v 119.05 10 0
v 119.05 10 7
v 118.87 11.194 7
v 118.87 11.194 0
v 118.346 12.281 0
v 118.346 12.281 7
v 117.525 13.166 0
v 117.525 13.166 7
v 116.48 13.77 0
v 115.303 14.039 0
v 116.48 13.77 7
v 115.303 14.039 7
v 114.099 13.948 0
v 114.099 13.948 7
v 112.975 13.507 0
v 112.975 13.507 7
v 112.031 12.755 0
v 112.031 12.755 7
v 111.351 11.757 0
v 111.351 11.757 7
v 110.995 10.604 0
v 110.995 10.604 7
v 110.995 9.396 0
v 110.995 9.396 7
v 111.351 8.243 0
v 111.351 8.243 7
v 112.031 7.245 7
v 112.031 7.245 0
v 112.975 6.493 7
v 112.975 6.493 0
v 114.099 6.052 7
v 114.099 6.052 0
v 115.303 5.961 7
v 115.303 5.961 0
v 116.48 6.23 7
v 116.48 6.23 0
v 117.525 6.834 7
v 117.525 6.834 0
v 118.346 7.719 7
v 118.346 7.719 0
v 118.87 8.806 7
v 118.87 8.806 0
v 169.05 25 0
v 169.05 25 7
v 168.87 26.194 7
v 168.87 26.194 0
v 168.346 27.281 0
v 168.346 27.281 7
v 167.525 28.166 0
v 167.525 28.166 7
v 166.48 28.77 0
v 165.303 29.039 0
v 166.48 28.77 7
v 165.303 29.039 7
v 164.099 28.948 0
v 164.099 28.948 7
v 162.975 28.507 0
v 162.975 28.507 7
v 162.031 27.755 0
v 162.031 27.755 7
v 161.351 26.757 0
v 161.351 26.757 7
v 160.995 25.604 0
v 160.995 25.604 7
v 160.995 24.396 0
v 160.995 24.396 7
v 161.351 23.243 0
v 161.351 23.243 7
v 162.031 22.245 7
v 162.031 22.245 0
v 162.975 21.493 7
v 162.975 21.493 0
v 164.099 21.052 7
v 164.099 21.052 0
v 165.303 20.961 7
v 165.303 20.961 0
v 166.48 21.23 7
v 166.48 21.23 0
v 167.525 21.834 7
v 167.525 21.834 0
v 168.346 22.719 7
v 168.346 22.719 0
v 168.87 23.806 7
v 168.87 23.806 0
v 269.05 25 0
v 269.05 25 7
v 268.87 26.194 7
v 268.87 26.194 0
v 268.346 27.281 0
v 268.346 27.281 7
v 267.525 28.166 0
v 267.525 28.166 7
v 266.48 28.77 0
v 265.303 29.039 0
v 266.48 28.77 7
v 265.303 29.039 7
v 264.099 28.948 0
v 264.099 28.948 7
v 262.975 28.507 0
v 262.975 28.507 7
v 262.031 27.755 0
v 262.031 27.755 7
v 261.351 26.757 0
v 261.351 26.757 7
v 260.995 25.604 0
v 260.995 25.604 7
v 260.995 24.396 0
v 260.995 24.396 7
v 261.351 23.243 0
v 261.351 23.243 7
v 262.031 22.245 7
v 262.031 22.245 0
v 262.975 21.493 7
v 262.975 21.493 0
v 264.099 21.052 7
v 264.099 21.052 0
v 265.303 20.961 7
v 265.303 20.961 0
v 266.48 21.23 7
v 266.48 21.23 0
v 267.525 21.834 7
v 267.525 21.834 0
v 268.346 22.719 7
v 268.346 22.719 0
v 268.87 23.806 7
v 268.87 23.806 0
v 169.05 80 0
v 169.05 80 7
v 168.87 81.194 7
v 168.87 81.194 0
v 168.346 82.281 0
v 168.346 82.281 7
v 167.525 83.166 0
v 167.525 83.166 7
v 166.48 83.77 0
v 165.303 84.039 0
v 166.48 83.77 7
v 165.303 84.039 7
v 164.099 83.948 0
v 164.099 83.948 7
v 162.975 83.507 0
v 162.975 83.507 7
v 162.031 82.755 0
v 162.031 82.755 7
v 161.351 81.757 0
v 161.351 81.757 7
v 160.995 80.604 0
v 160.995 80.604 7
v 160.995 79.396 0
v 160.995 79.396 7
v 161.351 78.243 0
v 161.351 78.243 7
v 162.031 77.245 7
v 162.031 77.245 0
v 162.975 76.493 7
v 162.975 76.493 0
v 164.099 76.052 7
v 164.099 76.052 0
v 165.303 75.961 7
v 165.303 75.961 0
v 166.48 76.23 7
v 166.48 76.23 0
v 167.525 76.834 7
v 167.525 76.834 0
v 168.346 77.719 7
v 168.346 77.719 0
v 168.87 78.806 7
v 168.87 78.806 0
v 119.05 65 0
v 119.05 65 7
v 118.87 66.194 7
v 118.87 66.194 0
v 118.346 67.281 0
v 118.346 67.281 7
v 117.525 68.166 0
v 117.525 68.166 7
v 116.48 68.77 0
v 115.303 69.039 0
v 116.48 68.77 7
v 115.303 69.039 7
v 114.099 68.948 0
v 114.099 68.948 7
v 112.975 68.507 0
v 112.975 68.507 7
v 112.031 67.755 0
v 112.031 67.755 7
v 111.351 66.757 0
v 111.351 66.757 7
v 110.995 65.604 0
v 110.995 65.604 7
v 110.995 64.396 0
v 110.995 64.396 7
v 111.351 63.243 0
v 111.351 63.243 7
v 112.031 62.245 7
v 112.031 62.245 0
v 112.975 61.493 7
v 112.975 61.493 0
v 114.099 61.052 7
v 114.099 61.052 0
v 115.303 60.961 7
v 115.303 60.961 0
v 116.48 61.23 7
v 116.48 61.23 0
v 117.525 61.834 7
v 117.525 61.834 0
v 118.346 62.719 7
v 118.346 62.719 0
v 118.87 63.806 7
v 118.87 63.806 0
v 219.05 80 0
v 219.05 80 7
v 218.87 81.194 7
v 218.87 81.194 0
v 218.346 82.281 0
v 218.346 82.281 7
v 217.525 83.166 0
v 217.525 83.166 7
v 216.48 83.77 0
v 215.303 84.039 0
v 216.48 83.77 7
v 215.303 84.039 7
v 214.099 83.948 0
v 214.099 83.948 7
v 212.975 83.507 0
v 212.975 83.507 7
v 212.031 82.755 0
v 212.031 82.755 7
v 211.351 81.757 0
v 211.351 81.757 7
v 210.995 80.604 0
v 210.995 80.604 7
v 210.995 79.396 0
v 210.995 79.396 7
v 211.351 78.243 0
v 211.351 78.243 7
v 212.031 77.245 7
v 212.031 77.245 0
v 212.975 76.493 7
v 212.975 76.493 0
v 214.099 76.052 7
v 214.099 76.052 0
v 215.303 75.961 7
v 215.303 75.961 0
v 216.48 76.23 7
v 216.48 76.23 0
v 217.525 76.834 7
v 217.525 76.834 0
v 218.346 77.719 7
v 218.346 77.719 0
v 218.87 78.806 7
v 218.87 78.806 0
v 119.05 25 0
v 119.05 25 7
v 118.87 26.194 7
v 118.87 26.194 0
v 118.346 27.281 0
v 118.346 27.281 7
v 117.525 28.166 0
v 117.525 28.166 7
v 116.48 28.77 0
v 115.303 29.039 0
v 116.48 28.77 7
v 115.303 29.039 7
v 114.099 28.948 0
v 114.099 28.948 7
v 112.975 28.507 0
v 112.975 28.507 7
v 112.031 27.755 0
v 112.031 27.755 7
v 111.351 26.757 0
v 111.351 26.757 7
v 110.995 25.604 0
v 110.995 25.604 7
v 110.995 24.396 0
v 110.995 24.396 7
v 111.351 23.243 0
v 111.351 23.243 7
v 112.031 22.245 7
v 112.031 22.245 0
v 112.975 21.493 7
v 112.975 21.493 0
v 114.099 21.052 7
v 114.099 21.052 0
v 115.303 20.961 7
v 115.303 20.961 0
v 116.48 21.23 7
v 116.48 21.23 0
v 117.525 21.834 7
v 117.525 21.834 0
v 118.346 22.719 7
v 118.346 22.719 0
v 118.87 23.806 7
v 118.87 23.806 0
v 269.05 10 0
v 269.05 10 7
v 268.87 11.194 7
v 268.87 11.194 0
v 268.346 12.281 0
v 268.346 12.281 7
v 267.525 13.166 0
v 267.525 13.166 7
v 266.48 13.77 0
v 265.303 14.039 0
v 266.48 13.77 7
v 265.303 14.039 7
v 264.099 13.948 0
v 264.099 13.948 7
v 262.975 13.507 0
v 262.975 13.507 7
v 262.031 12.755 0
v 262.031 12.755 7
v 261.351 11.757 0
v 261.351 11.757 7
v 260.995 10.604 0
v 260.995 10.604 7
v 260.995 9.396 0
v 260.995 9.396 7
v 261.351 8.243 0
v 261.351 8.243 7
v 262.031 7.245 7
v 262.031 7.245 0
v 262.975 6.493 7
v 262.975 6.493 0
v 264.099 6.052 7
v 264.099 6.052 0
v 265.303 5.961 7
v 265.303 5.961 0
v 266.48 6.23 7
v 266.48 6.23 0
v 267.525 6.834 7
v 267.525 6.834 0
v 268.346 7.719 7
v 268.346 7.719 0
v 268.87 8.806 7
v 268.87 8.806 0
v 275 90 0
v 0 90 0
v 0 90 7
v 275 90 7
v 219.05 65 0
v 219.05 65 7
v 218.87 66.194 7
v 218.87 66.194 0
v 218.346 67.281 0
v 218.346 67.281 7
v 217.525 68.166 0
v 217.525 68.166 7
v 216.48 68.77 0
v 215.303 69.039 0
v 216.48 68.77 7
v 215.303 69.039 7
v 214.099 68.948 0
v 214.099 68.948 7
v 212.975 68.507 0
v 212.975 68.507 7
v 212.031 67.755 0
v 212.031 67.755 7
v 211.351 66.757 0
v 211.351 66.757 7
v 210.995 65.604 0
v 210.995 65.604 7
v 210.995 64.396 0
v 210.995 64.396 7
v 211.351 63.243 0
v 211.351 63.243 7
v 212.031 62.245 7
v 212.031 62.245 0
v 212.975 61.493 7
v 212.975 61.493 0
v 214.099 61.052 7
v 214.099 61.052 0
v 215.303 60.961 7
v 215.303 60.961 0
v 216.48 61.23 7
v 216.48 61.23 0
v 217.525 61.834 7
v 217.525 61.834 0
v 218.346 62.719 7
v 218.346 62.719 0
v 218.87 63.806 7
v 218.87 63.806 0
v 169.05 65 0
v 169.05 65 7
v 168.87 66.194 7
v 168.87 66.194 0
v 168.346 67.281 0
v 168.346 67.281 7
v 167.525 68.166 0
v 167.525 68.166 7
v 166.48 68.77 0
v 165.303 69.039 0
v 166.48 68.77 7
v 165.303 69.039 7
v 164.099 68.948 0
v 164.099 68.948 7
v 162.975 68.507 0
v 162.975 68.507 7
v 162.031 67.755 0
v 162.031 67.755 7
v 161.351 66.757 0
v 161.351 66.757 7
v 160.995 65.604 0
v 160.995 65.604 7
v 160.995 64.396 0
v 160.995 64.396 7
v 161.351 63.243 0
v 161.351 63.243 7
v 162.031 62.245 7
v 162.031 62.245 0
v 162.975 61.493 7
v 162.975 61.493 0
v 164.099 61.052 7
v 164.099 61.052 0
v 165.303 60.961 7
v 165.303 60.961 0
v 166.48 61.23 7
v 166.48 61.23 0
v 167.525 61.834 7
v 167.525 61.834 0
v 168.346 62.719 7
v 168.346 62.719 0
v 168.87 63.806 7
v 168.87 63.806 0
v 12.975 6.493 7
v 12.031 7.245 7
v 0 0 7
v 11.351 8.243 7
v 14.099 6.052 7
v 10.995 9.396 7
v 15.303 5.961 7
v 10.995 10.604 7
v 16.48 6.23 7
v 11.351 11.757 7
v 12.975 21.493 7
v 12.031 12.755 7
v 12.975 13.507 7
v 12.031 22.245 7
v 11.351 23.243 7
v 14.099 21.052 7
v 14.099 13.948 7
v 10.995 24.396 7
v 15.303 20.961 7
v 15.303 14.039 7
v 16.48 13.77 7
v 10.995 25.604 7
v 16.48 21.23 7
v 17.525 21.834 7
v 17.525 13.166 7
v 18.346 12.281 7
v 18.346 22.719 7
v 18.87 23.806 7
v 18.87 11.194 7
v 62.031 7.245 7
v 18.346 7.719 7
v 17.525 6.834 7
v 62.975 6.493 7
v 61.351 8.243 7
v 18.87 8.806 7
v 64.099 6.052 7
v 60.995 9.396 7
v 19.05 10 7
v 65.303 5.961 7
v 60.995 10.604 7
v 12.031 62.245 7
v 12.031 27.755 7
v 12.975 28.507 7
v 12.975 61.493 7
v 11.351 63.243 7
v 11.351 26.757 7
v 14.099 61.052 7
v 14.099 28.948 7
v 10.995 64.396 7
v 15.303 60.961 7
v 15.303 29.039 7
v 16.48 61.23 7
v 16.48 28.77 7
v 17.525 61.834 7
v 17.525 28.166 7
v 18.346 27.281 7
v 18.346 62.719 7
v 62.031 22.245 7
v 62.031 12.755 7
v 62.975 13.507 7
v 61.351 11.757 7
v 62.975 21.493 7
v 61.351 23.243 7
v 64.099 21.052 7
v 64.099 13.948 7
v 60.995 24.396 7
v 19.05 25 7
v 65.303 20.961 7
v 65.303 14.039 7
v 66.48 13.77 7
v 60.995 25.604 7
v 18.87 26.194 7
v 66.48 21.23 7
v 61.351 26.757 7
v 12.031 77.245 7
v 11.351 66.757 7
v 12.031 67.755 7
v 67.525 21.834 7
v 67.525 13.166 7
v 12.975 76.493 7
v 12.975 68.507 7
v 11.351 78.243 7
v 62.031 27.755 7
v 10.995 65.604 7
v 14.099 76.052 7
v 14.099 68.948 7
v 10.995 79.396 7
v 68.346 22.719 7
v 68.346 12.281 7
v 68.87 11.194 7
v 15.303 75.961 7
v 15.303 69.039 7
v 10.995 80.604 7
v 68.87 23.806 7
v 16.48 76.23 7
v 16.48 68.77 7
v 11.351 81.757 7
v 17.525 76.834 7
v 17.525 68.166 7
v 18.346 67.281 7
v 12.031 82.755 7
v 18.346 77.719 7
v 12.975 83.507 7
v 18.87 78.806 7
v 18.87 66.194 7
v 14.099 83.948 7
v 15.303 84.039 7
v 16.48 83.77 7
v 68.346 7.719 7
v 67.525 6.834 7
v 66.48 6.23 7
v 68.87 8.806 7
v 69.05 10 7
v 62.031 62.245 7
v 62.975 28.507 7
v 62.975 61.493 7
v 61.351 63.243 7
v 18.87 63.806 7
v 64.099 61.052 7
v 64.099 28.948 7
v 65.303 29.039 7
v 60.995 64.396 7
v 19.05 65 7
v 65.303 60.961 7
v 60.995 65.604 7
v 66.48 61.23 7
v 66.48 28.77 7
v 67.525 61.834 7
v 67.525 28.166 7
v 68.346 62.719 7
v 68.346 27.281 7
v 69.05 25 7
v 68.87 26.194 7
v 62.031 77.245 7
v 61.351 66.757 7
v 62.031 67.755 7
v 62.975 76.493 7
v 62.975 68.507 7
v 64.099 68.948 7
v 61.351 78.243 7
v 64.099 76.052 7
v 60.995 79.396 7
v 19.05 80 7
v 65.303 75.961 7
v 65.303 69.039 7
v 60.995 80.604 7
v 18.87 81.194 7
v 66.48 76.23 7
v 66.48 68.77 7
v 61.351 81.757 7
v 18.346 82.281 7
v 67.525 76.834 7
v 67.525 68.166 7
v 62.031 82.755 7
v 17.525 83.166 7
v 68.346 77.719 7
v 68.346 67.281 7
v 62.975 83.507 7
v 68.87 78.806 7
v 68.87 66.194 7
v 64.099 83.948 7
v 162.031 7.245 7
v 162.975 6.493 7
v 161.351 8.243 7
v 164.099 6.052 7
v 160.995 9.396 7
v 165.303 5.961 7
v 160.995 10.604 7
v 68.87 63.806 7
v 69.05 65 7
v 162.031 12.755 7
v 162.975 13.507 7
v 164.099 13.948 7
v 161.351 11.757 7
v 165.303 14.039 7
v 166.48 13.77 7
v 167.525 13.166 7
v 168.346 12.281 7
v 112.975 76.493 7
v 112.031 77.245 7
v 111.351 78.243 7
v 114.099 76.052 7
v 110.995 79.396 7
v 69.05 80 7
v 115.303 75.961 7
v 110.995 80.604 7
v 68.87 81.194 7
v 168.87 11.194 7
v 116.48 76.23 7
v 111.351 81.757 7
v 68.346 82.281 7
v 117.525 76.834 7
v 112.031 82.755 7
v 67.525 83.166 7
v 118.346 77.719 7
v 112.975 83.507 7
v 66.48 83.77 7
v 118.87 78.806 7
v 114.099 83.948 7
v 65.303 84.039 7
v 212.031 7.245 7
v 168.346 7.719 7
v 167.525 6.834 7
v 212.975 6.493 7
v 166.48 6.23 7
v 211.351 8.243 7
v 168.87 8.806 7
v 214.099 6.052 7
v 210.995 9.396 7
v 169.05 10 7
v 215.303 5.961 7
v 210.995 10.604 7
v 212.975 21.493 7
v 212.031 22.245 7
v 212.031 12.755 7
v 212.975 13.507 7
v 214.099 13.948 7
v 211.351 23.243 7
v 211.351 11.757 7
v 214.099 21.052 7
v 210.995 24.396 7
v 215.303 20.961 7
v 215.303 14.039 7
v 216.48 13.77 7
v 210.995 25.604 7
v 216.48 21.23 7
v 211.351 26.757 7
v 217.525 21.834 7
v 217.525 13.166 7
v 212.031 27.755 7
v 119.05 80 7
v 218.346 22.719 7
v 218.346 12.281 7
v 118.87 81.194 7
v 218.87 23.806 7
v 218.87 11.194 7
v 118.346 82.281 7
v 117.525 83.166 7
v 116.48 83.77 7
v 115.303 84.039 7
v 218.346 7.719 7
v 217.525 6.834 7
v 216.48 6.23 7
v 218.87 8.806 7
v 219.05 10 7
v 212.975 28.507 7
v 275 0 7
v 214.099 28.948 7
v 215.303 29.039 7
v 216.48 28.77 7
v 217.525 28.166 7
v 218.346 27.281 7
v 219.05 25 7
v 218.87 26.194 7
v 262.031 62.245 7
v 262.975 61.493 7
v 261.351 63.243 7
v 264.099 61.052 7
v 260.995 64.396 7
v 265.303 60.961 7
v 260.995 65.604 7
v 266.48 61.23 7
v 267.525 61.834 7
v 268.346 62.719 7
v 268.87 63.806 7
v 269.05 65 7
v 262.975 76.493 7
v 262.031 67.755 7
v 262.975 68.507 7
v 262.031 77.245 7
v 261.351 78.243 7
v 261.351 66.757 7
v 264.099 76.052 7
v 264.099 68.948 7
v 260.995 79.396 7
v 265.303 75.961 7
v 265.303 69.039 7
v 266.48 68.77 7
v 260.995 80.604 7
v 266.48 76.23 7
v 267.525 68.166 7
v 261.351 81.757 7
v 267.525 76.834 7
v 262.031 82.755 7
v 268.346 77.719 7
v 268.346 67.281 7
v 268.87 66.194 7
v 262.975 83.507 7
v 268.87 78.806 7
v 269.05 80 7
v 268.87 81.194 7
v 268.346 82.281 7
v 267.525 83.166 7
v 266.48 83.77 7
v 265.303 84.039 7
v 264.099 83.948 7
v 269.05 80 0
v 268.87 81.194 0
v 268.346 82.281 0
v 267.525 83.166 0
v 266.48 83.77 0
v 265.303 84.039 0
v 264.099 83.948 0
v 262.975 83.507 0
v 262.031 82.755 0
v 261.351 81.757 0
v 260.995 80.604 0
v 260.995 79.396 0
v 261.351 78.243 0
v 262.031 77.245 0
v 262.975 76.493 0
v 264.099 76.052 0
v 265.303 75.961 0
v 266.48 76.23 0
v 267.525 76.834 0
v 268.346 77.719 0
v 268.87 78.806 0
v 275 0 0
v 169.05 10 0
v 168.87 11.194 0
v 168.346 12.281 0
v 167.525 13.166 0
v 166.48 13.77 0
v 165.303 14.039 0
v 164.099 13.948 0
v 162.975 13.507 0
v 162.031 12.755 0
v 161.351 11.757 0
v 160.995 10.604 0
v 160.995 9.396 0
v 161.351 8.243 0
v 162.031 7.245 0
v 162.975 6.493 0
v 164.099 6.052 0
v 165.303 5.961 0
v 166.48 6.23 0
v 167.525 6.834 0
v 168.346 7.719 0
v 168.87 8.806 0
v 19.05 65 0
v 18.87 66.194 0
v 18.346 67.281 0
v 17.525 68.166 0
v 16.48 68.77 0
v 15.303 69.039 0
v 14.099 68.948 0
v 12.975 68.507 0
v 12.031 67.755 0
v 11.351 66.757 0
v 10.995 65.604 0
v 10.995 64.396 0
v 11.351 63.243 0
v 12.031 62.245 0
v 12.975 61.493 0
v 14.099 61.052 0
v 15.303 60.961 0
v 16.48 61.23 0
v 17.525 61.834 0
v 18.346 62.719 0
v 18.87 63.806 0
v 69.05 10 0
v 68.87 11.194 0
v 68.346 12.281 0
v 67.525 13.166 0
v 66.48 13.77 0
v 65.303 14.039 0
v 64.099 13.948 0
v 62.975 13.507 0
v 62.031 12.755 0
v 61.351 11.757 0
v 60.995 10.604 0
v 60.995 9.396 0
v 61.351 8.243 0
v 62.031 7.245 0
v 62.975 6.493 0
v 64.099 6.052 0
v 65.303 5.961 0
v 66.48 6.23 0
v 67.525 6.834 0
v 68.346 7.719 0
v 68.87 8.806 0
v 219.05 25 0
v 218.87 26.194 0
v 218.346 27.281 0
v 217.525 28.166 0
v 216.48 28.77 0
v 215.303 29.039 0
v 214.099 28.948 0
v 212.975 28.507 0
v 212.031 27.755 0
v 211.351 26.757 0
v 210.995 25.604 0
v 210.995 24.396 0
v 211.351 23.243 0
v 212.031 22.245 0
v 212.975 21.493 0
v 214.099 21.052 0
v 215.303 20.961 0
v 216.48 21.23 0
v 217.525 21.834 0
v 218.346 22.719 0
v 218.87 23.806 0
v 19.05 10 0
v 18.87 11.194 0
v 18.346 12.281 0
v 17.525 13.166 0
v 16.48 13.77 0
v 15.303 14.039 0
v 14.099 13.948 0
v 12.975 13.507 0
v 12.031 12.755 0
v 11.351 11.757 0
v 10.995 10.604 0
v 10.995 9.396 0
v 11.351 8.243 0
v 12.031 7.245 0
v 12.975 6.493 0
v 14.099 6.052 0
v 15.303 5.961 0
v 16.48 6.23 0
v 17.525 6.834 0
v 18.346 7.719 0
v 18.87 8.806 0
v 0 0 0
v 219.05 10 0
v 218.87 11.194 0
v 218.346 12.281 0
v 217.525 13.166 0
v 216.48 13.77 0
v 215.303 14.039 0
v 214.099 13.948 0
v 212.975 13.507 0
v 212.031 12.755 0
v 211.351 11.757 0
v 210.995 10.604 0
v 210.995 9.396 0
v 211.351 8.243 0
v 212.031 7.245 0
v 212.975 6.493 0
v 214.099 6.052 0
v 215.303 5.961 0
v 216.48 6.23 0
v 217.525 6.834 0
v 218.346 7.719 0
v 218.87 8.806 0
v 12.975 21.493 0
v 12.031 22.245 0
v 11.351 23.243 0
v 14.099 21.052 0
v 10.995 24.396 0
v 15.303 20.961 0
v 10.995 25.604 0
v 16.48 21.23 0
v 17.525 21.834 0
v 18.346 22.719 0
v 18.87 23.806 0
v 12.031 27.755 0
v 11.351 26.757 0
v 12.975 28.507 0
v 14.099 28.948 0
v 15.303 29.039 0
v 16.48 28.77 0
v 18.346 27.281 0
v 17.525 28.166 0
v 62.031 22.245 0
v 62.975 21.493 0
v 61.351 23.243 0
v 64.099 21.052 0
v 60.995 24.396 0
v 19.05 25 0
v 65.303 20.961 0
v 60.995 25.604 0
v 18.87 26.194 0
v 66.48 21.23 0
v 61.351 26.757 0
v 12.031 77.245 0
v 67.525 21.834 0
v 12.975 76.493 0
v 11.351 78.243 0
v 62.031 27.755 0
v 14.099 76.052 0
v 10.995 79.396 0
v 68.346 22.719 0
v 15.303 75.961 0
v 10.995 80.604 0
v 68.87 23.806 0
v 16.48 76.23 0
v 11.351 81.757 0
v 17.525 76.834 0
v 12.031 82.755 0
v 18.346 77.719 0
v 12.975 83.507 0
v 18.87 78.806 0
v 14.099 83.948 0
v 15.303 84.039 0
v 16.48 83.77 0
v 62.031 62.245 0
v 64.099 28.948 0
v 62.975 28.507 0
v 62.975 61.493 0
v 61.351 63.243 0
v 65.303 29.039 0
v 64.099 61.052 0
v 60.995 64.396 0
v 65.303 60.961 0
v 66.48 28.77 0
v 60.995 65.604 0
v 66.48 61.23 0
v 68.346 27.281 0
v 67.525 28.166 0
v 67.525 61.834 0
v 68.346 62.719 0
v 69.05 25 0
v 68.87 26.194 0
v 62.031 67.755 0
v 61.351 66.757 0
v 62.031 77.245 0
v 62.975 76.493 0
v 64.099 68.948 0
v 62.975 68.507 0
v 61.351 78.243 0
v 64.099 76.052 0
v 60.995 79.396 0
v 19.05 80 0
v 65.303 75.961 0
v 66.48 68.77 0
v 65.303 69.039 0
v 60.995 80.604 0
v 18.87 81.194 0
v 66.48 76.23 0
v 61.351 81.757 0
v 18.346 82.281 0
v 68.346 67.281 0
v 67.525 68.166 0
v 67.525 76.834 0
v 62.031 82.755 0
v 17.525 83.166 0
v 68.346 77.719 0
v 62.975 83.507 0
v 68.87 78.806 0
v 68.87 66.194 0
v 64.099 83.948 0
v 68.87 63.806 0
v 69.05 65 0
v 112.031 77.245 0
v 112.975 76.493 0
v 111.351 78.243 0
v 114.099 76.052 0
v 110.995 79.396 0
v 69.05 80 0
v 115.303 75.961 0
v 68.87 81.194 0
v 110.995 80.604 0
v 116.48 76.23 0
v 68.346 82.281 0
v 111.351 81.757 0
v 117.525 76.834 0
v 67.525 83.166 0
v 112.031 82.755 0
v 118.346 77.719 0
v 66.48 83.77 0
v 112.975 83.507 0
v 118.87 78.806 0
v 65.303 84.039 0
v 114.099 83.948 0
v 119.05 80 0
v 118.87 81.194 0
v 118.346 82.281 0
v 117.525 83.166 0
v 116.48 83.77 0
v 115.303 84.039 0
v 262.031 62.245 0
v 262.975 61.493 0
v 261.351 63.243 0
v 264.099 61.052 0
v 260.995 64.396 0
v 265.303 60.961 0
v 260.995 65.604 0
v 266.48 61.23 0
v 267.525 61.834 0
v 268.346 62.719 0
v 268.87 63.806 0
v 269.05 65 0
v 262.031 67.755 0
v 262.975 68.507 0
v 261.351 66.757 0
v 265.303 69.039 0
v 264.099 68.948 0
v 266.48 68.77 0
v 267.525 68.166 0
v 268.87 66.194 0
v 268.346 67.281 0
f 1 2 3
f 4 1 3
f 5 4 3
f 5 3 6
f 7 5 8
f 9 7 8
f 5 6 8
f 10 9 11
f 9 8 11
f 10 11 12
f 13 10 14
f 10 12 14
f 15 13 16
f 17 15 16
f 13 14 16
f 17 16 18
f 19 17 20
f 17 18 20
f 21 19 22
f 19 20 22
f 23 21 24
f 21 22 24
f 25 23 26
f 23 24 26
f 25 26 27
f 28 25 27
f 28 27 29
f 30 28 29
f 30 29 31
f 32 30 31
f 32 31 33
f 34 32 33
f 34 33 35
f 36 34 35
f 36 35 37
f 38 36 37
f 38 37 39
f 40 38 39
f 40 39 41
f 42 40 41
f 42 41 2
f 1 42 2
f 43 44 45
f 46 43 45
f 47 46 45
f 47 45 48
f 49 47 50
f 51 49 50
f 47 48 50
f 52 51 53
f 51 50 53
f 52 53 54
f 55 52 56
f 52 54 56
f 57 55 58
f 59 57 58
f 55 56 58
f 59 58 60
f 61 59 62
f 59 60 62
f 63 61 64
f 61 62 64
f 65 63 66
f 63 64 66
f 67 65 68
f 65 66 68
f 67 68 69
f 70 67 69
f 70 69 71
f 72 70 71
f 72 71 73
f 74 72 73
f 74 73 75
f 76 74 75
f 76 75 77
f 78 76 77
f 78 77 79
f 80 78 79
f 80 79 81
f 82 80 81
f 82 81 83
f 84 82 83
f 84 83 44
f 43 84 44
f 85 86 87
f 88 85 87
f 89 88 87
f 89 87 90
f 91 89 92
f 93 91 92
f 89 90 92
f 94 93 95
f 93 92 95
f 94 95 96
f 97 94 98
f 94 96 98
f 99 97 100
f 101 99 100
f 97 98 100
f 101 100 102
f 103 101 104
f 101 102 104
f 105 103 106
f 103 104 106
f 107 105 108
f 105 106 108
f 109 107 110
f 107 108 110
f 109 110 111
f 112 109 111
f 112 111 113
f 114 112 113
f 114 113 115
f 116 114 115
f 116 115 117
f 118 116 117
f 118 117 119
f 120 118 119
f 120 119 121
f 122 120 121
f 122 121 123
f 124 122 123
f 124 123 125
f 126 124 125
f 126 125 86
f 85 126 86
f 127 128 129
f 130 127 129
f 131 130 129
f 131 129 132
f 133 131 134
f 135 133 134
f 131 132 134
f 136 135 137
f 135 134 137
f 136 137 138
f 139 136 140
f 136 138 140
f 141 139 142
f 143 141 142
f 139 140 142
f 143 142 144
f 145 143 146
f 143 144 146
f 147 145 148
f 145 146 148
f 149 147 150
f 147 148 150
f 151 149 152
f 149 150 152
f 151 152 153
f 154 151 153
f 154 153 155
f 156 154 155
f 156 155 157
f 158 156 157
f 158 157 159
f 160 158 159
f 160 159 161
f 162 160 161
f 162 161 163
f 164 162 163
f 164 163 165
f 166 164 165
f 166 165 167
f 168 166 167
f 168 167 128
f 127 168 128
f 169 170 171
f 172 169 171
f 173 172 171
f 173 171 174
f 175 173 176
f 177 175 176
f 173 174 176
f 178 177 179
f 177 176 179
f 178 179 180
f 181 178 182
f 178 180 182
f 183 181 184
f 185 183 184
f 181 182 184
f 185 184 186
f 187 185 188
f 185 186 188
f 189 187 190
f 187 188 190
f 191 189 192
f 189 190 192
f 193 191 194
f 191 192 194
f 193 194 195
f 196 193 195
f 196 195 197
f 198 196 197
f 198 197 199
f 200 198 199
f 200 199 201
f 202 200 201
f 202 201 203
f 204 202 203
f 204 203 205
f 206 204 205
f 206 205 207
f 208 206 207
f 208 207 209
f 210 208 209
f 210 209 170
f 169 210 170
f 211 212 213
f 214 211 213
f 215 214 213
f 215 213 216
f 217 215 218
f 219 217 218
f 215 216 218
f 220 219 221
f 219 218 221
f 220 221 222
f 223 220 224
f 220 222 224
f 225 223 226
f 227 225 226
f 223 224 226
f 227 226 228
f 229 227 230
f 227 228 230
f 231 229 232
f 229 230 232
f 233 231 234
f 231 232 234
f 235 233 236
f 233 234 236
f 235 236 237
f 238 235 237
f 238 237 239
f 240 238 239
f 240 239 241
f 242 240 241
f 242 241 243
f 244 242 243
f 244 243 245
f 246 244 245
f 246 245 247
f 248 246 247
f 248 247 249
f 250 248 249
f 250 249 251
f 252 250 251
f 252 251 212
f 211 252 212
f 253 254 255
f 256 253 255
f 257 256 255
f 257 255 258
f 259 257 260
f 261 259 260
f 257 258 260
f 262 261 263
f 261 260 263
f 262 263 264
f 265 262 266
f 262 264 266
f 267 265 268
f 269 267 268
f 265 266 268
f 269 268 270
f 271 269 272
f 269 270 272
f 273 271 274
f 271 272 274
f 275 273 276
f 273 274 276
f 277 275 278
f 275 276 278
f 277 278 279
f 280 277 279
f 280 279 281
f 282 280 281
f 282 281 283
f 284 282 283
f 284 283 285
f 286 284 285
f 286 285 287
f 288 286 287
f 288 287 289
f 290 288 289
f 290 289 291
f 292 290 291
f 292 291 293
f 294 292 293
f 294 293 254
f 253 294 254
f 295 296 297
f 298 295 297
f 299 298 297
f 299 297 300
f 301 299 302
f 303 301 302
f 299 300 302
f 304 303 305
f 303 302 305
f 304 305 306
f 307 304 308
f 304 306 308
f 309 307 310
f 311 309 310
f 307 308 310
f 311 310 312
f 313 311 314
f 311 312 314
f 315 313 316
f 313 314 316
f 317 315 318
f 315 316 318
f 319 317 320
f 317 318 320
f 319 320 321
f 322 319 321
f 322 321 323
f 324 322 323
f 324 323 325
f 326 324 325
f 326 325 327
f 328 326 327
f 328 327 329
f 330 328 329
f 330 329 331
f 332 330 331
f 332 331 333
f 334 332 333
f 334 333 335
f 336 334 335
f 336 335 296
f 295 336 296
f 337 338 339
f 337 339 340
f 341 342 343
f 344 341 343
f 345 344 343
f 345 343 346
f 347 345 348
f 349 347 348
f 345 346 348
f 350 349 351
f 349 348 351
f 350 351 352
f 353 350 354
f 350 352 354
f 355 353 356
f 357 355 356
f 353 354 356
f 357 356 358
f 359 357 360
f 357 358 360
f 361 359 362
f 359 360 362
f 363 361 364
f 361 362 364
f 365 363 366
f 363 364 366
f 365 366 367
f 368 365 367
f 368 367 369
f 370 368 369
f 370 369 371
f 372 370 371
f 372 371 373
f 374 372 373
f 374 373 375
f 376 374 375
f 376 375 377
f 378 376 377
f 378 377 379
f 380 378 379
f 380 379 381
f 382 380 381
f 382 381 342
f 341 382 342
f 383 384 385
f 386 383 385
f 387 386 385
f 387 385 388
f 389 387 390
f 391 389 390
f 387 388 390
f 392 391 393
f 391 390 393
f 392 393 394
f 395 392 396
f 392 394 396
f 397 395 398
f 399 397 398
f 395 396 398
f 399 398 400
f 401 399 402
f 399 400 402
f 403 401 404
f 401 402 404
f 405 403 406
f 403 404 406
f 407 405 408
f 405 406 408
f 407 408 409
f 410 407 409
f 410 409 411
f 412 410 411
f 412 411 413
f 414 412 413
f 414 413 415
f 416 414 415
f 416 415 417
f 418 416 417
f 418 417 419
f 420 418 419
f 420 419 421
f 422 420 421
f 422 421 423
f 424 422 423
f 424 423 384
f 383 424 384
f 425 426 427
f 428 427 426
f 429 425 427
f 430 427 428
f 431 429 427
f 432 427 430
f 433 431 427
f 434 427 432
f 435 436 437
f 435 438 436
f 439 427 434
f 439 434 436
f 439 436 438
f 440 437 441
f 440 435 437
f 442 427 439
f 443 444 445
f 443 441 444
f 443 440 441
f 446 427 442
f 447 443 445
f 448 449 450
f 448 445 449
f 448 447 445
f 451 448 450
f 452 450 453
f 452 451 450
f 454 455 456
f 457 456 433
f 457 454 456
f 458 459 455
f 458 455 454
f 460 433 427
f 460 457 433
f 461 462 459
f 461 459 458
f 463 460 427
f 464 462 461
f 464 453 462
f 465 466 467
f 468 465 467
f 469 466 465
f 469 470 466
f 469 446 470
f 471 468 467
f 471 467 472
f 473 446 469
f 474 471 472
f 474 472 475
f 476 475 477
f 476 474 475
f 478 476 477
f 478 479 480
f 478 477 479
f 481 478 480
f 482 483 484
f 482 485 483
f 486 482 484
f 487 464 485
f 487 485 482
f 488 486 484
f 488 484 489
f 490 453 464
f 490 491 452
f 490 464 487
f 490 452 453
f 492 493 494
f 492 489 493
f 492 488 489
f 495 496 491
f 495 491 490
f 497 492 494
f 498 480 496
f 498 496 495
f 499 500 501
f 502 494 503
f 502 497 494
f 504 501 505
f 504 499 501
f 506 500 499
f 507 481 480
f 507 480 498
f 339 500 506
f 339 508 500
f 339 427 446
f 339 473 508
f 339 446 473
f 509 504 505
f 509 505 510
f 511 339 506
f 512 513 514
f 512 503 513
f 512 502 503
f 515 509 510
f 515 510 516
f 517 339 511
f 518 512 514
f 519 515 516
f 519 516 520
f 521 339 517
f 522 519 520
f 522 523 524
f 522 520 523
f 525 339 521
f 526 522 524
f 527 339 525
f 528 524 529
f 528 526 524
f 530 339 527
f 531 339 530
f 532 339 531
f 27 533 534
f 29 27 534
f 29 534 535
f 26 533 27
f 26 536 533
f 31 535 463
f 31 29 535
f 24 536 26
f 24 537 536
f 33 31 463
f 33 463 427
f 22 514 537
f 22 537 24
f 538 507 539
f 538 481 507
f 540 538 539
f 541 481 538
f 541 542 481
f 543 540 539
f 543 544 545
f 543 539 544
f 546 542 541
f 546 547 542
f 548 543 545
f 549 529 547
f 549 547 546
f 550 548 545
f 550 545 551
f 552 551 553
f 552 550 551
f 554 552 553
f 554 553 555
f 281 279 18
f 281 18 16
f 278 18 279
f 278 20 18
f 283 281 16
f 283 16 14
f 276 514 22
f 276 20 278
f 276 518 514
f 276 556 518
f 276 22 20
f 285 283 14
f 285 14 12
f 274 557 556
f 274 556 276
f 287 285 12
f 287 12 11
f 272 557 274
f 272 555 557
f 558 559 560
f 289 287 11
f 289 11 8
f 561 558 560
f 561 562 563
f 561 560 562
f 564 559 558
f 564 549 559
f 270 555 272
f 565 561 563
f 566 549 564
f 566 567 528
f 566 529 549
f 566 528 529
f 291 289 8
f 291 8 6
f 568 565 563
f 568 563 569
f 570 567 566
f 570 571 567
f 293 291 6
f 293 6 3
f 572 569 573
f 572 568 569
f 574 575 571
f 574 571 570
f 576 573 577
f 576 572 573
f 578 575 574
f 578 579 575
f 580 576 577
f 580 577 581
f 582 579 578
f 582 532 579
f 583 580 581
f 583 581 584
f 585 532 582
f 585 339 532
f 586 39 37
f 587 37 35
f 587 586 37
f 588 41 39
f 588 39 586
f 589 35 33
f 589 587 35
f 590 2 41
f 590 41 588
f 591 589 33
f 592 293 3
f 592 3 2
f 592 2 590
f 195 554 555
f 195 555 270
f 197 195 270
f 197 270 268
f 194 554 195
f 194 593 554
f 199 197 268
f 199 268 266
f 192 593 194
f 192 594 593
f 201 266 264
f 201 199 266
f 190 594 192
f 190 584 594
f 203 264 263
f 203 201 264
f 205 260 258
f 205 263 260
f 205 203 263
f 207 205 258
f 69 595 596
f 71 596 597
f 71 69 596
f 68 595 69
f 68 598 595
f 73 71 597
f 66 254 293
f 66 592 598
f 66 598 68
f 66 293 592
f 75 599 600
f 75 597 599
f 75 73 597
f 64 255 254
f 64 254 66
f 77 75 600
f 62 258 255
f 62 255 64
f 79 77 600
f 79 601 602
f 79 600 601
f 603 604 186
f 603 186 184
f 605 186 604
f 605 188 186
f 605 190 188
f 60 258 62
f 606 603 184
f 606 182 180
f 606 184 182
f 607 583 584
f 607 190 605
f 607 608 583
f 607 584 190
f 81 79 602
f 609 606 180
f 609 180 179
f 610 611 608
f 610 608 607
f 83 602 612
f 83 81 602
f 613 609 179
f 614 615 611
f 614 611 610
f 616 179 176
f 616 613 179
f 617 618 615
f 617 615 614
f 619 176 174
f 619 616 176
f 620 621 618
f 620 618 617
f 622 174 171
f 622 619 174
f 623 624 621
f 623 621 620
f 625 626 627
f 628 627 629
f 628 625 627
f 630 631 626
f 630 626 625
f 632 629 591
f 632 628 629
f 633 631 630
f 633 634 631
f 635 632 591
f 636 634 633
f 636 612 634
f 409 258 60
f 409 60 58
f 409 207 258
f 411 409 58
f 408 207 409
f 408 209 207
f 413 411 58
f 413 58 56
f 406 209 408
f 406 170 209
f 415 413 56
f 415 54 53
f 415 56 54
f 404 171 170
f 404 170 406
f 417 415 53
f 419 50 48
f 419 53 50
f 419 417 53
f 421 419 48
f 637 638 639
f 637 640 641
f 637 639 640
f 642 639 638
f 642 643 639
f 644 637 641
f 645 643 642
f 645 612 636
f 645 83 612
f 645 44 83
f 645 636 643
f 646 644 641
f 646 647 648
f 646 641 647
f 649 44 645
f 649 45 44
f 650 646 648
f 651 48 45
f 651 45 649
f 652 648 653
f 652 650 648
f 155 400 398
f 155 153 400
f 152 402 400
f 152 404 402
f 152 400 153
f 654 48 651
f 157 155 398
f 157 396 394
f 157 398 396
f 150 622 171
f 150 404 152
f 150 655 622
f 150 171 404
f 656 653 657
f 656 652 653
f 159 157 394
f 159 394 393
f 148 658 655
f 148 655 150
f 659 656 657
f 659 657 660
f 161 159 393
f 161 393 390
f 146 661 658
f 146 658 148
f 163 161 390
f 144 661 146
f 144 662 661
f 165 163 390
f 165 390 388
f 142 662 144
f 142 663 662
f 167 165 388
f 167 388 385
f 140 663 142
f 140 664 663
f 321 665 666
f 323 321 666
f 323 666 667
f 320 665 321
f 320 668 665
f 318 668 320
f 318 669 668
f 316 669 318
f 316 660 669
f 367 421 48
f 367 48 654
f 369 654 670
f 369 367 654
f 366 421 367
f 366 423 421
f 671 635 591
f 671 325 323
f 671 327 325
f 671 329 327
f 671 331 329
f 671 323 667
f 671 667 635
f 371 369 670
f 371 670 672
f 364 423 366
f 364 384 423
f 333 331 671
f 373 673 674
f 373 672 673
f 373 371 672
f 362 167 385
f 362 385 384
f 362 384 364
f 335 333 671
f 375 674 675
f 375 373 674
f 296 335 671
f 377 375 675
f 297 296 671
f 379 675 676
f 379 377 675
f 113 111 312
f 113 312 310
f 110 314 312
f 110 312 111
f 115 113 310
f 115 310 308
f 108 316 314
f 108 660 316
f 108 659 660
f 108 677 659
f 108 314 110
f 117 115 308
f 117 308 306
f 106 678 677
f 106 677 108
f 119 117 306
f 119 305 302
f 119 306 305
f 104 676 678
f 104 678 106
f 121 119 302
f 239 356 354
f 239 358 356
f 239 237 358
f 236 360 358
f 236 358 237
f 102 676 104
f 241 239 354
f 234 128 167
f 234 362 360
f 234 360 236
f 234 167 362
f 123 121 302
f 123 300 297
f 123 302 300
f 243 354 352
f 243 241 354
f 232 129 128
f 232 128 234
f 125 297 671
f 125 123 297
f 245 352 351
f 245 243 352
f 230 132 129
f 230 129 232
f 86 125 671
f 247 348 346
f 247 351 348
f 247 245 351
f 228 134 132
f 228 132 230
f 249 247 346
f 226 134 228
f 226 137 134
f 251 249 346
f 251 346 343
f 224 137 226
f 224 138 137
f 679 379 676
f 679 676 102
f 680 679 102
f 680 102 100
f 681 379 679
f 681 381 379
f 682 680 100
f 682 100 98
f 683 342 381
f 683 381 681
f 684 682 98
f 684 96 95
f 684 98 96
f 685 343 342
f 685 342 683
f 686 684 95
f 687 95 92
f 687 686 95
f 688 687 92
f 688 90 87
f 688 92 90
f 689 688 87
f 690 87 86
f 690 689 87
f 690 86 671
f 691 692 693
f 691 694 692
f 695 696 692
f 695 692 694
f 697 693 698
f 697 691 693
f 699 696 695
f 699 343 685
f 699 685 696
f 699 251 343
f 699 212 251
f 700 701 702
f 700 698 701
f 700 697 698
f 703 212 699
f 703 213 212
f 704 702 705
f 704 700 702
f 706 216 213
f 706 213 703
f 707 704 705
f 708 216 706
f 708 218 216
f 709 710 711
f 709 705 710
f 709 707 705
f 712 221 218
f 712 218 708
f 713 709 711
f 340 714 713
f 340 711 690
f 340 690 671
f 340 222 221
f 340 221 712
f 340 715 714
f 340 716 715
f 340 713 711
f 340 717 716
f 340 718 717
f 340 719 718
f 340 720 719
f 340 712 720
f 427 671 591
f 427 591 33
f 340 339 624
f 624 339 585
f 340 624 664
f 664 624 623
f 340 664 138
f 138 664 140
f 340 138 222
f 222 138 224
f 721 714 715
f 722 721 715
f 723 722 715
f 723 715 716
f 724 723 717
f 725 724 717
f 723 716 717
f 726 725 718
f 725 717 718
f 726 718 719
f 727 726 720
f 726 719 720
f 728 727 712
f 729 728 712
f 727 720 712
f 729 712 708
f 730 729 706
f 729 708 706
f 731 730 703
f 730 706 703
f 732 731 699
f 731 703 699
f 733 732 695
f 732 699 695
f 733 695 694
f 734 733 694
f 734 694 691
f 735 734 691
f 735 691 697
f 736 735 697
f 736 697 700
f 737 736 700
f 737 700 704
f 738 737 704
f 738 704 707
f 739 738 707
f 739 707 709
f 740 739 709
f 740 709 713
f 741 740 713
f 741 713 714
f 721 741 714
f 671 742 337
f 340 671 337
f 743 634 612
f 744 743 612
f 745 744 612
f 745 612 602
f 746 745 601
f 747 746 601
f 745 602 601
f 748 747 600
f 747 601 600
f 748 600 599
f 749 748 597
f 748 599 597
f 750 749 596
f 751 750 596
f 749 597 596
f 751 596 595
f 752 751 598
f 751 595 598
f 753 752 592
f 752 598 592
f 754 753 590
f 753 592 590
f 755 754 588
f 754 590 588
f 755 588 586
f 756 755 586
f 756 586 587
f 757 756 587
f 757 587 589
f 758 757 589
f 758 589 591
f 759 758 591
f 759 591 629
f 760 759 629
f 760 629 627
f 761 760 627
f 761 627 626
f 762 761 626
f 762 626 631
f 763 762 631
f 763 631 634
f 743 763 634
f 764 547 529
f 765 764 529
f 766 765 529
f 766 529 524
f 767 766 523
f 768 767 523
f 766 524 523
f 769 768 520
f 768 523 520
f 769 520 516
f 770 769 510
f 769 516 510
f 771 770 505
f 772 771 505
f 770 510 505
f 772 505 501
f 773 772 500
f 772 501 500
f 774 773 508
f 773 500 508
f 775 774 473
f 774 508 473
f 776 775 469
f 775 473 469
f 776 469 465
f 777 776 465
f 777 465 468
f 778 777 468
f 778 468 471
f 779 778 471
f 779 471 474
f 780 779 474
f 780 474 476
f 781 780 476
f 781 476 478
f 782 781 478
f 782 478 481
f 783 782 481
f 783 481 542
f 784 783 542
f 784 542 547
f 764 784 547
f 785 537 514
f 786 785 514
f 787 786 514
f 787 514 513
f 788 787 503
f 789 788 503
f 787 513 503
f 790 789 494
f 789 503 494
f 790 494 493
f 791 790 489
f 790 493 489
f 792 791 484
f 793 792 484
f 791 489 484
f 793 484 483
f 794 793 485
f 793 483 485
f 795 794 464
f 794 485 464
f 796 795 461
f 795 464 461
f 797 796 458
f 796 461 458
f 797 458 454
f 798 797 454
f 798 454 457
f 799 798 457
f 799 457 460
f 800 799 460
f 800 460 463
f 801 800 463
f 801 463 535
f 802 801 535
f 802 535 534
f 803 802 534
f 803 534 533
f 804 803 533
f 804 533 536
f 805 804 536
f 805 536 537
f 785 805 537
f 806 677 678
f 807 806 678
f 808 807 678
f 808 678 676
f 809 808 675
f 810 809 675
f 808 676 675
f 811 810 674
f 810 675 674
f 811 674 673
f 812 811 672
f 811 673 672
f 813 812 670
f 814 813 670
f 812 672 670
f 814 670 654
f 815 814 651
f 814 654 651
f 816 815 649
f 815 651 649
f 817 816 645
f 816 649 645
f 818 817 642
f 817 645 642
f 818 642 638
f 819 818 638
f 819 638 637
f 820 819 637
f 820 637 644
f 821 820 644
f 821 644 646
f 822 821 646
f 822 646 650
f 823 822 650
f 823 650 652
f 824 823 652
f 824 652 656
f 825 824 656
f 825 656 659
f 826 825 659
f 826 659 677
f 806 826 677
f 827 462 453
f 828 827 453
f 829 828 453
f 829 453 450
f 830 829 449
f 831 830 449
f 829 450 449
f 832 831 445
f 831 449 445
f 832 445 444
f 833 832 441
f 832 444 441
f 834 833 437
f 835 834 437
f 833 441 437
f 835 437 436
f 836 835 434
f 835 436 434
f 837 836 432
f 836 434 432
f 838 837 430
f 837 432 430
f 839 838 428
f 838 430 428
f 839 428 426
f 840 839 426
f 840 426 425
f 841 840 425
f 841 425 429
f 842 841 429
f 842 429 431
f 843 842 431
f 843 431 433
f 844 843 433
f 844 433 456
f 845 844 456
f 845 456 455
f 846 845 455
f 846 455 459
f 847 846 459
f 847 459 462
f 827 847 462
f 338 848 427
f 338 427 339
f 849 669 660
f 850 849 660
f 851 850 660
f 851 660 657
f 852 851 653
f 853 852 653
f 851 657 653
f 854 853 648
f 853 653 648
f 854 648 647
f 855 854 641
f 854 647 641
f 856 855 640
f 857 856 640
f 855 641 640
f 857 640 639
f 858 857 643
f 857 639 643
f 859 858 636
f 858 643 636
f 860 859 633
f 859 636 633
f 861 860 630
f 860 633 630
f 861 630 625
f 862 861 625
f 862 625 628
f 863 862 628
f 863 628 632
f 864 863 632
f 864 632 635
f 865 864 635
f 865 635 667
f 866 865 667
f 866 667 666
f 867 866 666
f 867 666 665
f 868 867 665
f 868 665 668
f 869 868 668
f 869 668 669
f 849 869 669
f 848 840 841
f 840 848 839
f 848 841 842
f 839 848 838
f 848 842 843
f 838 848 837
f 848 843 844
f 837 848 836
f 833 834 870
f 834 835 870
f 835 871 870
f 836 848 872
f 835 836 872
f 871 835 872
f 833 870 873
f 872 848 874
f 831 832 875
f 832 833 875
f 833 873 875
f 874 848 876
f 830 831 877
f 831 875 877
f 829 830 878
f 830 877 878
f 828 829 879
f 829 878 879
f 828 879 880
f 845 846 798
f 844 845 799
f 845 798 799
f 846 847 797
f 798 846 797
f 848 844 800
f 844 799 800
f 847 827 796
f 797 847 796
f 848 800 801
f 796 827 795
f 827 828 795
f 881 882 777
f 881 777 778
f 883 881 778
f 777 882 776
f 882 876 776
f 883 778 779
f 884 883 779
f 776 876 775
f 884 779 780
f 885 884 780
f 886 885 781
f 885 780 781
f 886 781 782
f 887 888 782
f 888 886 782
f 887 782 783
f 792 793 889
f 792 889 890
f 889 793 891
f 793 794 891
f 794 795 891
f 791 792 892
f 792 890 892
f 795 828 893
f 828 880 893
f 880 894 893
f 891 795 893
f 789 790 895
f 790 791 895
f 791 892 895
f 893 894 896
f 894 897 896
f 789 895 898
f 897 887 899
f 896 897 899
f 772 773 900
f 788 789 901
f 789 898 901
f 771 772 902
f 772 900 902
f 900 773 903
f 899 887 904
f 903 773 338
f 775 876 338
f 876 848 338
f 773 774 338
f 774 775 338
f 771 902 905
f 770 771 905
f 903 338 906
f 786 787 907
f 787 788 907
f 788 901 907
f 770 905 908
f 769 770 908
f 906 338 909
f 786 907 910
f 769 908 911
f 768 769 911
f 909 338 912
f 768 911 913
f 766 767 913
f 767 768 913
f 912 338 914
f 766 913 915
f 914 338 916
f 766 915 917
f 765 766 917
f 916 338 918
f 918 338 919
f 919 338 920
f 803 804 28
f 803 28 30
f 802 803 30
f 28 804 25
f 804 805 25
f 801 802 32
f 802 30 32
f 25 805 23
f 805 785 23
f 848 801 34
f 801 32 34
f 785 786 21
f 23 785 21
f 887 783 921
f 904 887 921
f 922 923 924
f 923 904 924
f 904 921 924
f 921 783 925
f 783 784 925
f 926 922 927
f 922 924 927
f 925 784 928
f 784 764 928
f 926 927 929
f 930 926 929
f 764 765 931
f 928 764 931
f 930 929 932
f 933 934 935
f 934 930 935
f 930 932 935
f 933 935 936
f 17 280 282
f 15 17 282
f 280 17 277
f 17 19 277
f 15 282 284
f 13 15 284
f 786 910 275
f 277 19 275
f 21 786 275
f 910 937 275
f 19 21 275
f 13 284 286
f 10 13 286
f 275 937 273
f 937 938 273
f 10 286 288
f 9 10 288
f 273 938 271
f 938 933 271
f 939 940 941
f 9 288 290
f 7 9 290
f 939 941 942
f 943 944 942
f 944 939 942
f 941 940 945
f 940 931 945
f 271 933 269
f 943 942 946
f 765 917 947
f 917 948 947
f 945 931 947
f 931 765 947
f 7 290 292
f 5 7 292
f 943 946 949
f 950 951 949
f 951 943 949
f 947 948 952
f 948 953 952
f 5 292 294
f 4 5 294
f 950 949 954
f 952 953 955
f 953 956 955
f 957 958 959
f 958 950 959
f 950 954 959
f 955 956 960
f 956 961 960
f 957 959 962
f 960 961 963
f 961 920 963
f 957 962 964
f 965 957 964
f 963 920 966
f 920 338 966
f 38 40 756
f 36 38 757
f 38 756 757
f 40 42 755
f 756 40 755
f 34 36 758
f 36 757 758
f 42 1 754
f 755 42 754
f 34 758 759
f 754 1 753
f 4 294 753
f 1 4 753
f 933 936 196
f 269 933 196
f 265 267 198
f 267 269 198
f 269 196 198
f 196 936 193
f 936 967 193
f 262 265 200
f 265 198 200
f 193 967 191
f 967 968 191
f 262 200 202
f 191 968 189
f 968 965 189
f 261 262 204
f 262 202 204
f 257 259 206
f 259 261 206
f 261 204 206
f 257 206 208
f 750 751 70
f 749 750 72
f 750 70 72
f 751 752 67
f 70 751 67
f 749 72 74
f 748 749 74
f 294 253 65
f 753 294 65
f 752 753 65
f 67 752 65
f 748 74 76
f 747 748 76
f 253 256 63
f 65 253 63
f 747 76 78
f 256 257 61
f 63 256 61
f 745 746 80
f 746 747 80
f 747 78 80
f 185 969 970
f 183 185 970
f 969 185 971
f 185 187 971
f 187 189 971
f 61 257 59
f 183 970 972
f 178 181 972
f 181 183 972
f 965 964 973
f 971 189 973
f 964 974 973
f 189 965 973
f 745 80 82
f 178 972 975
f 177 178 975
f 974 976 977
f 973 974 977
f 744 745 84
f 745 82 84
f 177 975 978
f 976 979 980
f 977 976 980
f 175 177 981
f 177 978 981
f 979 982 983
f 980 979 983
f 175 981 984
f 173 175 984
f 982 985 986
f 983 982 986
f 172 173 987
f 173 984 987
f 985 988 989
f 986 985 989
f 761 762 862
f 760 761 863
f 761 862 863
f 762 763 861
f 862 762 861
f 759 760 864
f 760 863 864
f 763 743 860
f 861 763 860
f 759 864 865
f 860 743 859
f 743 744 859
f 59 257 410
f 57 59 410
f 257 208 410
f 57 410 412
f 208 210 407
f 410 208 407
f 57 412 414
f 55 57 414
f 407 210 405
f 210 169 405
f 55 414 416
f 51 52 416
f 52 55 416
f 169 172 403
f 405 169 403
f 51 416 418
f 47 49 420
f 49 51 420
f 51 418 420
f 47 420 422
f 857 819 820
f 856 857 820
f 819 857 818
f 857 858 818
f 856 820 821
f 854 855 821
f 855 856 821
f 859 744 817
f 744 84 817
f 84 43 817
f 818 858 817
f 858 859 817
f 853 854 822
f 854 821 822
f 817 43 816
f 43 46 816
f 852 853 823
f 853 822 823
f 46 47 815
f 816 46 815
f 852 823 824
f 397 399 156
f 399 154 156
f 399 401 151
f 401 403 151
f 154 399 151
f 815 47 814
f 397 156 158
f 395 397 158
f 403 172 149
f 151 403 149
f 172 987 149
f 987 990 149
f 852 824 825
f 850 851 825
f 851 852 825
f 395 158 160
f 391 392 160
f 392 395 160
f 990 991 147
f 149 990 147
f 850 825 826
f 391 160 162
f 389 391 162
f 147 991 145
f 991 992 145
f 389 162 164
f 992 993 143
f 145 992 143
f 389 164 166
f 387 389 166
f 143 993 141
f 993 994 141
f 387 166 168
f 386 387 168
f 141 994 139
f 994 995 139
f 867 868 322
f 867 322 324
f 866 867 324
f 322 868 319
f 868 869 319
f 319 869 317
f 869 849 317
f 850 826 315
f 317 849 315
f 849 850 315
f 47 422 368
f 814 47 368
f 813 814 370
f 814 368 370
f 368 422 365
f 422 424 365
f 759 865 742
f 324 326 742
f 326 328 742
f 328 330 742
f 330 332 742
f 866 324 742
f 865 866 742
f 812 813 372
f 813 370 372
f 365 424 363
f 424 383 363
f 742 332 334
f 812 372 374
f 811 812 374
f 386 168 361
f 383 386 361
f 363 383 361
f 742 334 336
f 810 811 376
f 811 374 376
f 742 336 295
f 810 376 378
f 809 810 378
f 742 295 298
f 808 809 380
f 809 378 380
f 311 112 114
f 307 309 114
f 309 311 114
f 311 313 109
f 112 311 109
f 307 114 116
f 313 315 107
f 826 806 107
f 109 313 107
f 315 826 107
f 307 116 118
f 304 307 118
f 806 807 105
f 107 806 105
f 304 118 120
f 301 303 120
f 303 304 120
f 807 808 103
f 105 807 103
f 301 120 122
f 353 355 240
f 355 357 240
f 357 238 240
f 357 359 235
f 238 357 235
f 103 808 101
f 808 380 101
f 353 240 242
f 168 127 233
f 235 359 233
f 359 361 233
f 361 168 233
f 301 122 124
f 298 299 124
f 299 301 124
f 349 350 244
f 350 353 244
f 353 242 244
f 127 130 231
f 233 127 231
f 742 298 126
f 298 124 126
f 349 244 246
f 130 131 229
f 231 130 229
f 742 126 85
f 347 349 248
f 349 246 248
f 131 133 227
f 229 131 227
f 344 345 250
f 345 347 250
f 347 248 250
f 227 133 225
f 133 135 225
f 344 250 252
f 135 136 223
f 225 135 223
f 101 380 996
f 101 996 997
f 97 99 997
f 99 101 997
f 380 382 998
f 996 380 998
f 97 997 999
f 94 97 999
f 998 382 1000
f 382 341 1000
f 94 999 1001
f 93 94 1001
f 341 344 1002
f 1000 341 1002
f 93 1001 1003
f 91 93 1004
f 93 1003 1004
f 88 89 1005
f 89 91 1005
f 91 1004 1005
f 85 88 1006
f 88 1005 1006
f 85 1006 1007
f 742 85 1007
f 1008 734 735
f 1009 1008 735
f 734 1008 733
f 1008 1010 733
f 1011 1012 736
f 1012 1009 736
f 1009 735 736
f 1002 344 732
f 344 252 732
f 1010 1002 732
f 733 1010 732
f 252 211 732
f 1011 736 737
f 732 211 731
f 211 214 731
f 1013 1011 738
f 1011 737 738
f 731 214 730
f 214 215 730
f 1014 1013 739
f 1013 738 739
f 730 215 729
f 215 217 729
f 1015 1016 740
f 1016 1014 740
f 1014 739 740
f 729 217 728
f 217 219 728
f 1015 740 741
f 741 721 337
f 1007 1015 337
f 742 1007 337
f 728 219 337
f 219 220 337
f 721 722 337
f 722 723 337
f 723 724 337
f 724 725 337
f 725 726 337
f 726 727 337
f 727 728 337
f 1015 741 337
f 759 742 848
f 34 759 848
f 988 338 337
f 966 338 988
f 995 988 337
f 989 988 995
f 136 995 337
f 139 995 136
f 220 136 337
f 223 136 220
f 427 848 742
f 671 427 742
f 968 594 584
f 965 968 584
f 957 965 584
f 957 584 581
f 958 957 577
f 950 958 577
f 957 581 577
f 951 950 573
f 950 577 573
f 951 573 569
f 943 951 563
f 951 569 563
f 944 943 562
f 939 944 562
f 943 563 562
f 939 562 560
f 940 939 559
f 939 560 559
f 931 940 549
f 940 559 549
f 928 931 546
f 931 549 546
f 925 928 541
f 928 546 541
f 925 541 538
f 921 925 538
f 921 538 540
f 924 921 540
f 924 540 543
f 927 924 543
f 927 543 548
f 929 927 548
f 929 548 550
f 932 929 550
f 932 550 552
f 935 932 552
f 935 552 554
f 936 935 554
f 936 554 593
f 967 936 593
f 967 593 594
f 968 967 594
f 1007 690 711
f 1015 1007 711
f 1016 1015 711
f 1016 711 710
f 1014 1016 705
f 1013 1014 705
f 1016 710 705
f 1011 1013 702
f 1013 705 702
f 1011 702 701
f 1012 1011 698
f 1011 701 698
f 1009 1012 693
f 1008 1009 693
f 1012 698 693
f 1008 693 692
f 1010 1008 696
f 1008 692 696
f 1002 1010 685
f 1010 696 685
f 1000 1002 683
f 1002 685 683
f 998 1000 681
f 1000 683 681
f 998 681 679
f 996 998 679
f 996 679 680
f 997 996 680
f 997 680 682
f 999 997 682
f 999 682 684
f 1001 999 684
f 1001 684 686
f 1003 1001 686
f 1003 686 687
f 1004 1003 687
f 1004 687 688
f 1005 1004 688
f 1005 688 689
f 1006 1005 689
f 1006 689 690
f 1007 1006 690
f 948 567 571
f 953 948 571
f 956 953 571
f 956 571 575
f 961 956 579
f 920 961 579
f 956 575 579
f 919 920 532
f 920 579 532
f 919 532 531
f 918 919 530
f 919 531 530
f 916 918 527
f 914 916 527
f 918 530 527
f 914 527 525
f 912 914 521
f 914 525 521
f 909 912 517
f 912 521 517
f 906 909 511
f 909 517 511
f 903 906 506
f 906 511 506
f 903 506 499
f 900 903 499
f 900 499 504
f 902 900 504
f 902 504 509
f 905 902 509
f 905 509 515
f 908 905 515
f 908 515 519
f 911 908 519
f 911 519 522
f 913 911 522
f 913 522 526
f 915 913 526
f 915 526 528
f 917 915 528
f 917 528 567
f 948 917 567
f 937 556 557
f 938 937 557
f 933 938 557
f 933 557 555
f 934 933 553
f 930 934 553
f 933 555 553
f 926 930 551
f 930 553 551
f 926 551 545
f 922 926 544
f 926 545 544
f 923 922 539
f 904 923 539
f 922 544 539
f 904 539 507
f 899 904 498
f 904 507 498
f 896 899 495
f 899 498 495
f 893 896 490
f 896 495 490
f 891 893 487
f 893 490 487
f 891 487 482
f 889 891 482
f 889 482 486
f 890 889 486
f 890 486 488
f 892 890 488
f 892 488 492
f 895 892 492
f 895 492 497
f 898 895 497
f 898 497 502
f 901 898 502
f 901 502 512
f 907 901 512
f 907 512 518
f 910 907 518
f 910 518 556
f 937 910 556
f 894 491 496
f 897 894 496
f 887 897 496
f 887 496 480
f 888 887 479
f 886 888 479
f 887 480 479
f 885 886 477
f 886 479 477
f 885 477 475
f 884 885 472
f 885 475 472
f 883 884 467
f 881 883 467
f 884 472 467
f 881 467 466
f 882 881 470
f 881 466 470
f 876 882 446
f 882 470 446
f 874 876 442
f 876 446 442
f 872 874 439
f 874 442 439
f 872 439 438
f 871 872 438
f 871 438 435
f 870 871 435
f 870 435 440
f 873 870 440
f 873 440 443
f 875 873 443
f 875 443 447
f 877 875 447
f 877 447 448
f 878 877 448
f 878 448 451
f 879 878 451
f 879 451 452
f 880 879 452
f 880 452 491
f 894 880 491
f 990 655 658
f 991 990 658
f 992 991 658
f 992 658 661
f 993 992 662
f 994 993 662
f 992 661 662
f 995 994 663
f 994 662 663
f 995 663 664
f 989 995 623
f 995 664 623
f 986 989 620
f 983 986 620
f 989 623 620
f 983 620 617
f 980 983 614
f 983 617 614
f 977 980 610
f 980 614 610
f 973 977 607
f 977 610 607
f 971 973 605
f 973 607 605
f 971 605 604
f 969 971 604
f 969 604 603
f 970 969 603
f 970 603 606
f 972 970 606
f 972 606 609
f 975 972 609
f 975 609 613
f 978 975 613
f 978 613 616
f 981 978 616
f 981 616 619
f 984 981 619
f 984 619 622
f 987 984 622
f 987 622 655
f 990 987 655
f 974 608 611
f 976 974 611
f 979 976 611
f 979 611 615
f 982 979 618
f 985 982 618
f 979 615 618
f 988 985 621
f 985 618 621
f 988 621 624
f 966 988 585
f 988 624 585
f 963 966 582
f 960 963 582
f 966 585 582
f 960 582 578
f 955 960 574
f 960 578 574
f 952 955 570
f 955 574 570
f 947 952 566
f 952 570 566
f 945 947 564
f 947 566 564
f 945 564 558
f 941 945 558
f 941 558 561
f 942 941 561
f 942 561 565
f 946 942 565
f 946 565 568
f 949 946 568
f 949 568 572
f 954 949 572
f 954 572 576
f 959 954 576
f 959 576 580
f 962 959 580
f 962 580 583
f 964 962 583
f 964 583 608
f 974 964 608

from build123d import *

# Parameters (mm, degrees)
SKETCH1_W           = 275
SKETCH1_H           = 90
BOSS_EXTRUDE1_DEPTH = 7
SKETCH2_R           = 4.05
CUT_EXTRUDE1_DEPTH  = 10


with BuildPart() as part:
    # Sketch1 → Boss-Extrude1 (new body)
    with BuildSketch(Plane.XY):
        with Locations((137.5, 45)):
            Rectangle(SKETCH1_W, SKETCH1_H)
    extrude(amount=BOSS_EXTRUDE1_DEPTH)

    # Sketch2 → Cut-Extrude1 (cut)
    with BuildSketch(Plane.XY.offset(7)):
        with Locations((265, 65)):
            Circle(SKETCH2_R)
        with Locations((265, 25)):
            Circle(SKETCH2_R)
        with Locations((215, 65)):
            Circle(SKETCH2_R)
        with Locations((215, 25)):
            Circle(SKETCH2_R)
        with Locations((165, 65)):
            Circle(SKETCH2_R)
        with Locations((165, 25)):
            Circle(SKETCH2_R)
        with Locations((115, 65)):
            Circle(SKETCH2_R)
        with Locations((115, 25)):
            Circle(SKETCH2_R)
        with Locations((65, 65)):
            Circle(SKETCH2_R)
        with Locations((65, 25)):
            Circle(SKETCH2_R)
        with Locations((265, 80)):
            Circle(SKETCH2_R)
        with Locations((265, 10)):
            Circle(SKETCH2_R)
        with Locations((215, 80)):
            Circle(SKETCH2_R)
        with Locations((215, 10)):
            Circle(SKETCH2_R)
        with Locations((165, 80)):
            Circle(SKETCH2_R)
        with Locations((165, 10)):
            Circle(SKETCH2_R)
        with Locations((115, 80)):
            Circle(SKETCH2_R)
        with Locations((115, 10)):
            Circle(SKETCH2_R)
        with Locations((65, 80)):
            Circle(SKETCH2_R)
        with Locations((65, 10)):
            Circle(SKETCH2_R)
        with Locations((15, 80)):
            Circle(SKETCH2_R)
        with Locations((15, 25)):
            Circle(SKETCH2_R)
        with Locations((15, 10)):
            Circle(SKETCH2_R)
        with Locations((15, 65)):
            Circle(SKETCH2_R)
    extrude(amount=-CUT_EXTRUDE1_DEPTH, mode=Mode.SUBTRACT)


solid = part.part
